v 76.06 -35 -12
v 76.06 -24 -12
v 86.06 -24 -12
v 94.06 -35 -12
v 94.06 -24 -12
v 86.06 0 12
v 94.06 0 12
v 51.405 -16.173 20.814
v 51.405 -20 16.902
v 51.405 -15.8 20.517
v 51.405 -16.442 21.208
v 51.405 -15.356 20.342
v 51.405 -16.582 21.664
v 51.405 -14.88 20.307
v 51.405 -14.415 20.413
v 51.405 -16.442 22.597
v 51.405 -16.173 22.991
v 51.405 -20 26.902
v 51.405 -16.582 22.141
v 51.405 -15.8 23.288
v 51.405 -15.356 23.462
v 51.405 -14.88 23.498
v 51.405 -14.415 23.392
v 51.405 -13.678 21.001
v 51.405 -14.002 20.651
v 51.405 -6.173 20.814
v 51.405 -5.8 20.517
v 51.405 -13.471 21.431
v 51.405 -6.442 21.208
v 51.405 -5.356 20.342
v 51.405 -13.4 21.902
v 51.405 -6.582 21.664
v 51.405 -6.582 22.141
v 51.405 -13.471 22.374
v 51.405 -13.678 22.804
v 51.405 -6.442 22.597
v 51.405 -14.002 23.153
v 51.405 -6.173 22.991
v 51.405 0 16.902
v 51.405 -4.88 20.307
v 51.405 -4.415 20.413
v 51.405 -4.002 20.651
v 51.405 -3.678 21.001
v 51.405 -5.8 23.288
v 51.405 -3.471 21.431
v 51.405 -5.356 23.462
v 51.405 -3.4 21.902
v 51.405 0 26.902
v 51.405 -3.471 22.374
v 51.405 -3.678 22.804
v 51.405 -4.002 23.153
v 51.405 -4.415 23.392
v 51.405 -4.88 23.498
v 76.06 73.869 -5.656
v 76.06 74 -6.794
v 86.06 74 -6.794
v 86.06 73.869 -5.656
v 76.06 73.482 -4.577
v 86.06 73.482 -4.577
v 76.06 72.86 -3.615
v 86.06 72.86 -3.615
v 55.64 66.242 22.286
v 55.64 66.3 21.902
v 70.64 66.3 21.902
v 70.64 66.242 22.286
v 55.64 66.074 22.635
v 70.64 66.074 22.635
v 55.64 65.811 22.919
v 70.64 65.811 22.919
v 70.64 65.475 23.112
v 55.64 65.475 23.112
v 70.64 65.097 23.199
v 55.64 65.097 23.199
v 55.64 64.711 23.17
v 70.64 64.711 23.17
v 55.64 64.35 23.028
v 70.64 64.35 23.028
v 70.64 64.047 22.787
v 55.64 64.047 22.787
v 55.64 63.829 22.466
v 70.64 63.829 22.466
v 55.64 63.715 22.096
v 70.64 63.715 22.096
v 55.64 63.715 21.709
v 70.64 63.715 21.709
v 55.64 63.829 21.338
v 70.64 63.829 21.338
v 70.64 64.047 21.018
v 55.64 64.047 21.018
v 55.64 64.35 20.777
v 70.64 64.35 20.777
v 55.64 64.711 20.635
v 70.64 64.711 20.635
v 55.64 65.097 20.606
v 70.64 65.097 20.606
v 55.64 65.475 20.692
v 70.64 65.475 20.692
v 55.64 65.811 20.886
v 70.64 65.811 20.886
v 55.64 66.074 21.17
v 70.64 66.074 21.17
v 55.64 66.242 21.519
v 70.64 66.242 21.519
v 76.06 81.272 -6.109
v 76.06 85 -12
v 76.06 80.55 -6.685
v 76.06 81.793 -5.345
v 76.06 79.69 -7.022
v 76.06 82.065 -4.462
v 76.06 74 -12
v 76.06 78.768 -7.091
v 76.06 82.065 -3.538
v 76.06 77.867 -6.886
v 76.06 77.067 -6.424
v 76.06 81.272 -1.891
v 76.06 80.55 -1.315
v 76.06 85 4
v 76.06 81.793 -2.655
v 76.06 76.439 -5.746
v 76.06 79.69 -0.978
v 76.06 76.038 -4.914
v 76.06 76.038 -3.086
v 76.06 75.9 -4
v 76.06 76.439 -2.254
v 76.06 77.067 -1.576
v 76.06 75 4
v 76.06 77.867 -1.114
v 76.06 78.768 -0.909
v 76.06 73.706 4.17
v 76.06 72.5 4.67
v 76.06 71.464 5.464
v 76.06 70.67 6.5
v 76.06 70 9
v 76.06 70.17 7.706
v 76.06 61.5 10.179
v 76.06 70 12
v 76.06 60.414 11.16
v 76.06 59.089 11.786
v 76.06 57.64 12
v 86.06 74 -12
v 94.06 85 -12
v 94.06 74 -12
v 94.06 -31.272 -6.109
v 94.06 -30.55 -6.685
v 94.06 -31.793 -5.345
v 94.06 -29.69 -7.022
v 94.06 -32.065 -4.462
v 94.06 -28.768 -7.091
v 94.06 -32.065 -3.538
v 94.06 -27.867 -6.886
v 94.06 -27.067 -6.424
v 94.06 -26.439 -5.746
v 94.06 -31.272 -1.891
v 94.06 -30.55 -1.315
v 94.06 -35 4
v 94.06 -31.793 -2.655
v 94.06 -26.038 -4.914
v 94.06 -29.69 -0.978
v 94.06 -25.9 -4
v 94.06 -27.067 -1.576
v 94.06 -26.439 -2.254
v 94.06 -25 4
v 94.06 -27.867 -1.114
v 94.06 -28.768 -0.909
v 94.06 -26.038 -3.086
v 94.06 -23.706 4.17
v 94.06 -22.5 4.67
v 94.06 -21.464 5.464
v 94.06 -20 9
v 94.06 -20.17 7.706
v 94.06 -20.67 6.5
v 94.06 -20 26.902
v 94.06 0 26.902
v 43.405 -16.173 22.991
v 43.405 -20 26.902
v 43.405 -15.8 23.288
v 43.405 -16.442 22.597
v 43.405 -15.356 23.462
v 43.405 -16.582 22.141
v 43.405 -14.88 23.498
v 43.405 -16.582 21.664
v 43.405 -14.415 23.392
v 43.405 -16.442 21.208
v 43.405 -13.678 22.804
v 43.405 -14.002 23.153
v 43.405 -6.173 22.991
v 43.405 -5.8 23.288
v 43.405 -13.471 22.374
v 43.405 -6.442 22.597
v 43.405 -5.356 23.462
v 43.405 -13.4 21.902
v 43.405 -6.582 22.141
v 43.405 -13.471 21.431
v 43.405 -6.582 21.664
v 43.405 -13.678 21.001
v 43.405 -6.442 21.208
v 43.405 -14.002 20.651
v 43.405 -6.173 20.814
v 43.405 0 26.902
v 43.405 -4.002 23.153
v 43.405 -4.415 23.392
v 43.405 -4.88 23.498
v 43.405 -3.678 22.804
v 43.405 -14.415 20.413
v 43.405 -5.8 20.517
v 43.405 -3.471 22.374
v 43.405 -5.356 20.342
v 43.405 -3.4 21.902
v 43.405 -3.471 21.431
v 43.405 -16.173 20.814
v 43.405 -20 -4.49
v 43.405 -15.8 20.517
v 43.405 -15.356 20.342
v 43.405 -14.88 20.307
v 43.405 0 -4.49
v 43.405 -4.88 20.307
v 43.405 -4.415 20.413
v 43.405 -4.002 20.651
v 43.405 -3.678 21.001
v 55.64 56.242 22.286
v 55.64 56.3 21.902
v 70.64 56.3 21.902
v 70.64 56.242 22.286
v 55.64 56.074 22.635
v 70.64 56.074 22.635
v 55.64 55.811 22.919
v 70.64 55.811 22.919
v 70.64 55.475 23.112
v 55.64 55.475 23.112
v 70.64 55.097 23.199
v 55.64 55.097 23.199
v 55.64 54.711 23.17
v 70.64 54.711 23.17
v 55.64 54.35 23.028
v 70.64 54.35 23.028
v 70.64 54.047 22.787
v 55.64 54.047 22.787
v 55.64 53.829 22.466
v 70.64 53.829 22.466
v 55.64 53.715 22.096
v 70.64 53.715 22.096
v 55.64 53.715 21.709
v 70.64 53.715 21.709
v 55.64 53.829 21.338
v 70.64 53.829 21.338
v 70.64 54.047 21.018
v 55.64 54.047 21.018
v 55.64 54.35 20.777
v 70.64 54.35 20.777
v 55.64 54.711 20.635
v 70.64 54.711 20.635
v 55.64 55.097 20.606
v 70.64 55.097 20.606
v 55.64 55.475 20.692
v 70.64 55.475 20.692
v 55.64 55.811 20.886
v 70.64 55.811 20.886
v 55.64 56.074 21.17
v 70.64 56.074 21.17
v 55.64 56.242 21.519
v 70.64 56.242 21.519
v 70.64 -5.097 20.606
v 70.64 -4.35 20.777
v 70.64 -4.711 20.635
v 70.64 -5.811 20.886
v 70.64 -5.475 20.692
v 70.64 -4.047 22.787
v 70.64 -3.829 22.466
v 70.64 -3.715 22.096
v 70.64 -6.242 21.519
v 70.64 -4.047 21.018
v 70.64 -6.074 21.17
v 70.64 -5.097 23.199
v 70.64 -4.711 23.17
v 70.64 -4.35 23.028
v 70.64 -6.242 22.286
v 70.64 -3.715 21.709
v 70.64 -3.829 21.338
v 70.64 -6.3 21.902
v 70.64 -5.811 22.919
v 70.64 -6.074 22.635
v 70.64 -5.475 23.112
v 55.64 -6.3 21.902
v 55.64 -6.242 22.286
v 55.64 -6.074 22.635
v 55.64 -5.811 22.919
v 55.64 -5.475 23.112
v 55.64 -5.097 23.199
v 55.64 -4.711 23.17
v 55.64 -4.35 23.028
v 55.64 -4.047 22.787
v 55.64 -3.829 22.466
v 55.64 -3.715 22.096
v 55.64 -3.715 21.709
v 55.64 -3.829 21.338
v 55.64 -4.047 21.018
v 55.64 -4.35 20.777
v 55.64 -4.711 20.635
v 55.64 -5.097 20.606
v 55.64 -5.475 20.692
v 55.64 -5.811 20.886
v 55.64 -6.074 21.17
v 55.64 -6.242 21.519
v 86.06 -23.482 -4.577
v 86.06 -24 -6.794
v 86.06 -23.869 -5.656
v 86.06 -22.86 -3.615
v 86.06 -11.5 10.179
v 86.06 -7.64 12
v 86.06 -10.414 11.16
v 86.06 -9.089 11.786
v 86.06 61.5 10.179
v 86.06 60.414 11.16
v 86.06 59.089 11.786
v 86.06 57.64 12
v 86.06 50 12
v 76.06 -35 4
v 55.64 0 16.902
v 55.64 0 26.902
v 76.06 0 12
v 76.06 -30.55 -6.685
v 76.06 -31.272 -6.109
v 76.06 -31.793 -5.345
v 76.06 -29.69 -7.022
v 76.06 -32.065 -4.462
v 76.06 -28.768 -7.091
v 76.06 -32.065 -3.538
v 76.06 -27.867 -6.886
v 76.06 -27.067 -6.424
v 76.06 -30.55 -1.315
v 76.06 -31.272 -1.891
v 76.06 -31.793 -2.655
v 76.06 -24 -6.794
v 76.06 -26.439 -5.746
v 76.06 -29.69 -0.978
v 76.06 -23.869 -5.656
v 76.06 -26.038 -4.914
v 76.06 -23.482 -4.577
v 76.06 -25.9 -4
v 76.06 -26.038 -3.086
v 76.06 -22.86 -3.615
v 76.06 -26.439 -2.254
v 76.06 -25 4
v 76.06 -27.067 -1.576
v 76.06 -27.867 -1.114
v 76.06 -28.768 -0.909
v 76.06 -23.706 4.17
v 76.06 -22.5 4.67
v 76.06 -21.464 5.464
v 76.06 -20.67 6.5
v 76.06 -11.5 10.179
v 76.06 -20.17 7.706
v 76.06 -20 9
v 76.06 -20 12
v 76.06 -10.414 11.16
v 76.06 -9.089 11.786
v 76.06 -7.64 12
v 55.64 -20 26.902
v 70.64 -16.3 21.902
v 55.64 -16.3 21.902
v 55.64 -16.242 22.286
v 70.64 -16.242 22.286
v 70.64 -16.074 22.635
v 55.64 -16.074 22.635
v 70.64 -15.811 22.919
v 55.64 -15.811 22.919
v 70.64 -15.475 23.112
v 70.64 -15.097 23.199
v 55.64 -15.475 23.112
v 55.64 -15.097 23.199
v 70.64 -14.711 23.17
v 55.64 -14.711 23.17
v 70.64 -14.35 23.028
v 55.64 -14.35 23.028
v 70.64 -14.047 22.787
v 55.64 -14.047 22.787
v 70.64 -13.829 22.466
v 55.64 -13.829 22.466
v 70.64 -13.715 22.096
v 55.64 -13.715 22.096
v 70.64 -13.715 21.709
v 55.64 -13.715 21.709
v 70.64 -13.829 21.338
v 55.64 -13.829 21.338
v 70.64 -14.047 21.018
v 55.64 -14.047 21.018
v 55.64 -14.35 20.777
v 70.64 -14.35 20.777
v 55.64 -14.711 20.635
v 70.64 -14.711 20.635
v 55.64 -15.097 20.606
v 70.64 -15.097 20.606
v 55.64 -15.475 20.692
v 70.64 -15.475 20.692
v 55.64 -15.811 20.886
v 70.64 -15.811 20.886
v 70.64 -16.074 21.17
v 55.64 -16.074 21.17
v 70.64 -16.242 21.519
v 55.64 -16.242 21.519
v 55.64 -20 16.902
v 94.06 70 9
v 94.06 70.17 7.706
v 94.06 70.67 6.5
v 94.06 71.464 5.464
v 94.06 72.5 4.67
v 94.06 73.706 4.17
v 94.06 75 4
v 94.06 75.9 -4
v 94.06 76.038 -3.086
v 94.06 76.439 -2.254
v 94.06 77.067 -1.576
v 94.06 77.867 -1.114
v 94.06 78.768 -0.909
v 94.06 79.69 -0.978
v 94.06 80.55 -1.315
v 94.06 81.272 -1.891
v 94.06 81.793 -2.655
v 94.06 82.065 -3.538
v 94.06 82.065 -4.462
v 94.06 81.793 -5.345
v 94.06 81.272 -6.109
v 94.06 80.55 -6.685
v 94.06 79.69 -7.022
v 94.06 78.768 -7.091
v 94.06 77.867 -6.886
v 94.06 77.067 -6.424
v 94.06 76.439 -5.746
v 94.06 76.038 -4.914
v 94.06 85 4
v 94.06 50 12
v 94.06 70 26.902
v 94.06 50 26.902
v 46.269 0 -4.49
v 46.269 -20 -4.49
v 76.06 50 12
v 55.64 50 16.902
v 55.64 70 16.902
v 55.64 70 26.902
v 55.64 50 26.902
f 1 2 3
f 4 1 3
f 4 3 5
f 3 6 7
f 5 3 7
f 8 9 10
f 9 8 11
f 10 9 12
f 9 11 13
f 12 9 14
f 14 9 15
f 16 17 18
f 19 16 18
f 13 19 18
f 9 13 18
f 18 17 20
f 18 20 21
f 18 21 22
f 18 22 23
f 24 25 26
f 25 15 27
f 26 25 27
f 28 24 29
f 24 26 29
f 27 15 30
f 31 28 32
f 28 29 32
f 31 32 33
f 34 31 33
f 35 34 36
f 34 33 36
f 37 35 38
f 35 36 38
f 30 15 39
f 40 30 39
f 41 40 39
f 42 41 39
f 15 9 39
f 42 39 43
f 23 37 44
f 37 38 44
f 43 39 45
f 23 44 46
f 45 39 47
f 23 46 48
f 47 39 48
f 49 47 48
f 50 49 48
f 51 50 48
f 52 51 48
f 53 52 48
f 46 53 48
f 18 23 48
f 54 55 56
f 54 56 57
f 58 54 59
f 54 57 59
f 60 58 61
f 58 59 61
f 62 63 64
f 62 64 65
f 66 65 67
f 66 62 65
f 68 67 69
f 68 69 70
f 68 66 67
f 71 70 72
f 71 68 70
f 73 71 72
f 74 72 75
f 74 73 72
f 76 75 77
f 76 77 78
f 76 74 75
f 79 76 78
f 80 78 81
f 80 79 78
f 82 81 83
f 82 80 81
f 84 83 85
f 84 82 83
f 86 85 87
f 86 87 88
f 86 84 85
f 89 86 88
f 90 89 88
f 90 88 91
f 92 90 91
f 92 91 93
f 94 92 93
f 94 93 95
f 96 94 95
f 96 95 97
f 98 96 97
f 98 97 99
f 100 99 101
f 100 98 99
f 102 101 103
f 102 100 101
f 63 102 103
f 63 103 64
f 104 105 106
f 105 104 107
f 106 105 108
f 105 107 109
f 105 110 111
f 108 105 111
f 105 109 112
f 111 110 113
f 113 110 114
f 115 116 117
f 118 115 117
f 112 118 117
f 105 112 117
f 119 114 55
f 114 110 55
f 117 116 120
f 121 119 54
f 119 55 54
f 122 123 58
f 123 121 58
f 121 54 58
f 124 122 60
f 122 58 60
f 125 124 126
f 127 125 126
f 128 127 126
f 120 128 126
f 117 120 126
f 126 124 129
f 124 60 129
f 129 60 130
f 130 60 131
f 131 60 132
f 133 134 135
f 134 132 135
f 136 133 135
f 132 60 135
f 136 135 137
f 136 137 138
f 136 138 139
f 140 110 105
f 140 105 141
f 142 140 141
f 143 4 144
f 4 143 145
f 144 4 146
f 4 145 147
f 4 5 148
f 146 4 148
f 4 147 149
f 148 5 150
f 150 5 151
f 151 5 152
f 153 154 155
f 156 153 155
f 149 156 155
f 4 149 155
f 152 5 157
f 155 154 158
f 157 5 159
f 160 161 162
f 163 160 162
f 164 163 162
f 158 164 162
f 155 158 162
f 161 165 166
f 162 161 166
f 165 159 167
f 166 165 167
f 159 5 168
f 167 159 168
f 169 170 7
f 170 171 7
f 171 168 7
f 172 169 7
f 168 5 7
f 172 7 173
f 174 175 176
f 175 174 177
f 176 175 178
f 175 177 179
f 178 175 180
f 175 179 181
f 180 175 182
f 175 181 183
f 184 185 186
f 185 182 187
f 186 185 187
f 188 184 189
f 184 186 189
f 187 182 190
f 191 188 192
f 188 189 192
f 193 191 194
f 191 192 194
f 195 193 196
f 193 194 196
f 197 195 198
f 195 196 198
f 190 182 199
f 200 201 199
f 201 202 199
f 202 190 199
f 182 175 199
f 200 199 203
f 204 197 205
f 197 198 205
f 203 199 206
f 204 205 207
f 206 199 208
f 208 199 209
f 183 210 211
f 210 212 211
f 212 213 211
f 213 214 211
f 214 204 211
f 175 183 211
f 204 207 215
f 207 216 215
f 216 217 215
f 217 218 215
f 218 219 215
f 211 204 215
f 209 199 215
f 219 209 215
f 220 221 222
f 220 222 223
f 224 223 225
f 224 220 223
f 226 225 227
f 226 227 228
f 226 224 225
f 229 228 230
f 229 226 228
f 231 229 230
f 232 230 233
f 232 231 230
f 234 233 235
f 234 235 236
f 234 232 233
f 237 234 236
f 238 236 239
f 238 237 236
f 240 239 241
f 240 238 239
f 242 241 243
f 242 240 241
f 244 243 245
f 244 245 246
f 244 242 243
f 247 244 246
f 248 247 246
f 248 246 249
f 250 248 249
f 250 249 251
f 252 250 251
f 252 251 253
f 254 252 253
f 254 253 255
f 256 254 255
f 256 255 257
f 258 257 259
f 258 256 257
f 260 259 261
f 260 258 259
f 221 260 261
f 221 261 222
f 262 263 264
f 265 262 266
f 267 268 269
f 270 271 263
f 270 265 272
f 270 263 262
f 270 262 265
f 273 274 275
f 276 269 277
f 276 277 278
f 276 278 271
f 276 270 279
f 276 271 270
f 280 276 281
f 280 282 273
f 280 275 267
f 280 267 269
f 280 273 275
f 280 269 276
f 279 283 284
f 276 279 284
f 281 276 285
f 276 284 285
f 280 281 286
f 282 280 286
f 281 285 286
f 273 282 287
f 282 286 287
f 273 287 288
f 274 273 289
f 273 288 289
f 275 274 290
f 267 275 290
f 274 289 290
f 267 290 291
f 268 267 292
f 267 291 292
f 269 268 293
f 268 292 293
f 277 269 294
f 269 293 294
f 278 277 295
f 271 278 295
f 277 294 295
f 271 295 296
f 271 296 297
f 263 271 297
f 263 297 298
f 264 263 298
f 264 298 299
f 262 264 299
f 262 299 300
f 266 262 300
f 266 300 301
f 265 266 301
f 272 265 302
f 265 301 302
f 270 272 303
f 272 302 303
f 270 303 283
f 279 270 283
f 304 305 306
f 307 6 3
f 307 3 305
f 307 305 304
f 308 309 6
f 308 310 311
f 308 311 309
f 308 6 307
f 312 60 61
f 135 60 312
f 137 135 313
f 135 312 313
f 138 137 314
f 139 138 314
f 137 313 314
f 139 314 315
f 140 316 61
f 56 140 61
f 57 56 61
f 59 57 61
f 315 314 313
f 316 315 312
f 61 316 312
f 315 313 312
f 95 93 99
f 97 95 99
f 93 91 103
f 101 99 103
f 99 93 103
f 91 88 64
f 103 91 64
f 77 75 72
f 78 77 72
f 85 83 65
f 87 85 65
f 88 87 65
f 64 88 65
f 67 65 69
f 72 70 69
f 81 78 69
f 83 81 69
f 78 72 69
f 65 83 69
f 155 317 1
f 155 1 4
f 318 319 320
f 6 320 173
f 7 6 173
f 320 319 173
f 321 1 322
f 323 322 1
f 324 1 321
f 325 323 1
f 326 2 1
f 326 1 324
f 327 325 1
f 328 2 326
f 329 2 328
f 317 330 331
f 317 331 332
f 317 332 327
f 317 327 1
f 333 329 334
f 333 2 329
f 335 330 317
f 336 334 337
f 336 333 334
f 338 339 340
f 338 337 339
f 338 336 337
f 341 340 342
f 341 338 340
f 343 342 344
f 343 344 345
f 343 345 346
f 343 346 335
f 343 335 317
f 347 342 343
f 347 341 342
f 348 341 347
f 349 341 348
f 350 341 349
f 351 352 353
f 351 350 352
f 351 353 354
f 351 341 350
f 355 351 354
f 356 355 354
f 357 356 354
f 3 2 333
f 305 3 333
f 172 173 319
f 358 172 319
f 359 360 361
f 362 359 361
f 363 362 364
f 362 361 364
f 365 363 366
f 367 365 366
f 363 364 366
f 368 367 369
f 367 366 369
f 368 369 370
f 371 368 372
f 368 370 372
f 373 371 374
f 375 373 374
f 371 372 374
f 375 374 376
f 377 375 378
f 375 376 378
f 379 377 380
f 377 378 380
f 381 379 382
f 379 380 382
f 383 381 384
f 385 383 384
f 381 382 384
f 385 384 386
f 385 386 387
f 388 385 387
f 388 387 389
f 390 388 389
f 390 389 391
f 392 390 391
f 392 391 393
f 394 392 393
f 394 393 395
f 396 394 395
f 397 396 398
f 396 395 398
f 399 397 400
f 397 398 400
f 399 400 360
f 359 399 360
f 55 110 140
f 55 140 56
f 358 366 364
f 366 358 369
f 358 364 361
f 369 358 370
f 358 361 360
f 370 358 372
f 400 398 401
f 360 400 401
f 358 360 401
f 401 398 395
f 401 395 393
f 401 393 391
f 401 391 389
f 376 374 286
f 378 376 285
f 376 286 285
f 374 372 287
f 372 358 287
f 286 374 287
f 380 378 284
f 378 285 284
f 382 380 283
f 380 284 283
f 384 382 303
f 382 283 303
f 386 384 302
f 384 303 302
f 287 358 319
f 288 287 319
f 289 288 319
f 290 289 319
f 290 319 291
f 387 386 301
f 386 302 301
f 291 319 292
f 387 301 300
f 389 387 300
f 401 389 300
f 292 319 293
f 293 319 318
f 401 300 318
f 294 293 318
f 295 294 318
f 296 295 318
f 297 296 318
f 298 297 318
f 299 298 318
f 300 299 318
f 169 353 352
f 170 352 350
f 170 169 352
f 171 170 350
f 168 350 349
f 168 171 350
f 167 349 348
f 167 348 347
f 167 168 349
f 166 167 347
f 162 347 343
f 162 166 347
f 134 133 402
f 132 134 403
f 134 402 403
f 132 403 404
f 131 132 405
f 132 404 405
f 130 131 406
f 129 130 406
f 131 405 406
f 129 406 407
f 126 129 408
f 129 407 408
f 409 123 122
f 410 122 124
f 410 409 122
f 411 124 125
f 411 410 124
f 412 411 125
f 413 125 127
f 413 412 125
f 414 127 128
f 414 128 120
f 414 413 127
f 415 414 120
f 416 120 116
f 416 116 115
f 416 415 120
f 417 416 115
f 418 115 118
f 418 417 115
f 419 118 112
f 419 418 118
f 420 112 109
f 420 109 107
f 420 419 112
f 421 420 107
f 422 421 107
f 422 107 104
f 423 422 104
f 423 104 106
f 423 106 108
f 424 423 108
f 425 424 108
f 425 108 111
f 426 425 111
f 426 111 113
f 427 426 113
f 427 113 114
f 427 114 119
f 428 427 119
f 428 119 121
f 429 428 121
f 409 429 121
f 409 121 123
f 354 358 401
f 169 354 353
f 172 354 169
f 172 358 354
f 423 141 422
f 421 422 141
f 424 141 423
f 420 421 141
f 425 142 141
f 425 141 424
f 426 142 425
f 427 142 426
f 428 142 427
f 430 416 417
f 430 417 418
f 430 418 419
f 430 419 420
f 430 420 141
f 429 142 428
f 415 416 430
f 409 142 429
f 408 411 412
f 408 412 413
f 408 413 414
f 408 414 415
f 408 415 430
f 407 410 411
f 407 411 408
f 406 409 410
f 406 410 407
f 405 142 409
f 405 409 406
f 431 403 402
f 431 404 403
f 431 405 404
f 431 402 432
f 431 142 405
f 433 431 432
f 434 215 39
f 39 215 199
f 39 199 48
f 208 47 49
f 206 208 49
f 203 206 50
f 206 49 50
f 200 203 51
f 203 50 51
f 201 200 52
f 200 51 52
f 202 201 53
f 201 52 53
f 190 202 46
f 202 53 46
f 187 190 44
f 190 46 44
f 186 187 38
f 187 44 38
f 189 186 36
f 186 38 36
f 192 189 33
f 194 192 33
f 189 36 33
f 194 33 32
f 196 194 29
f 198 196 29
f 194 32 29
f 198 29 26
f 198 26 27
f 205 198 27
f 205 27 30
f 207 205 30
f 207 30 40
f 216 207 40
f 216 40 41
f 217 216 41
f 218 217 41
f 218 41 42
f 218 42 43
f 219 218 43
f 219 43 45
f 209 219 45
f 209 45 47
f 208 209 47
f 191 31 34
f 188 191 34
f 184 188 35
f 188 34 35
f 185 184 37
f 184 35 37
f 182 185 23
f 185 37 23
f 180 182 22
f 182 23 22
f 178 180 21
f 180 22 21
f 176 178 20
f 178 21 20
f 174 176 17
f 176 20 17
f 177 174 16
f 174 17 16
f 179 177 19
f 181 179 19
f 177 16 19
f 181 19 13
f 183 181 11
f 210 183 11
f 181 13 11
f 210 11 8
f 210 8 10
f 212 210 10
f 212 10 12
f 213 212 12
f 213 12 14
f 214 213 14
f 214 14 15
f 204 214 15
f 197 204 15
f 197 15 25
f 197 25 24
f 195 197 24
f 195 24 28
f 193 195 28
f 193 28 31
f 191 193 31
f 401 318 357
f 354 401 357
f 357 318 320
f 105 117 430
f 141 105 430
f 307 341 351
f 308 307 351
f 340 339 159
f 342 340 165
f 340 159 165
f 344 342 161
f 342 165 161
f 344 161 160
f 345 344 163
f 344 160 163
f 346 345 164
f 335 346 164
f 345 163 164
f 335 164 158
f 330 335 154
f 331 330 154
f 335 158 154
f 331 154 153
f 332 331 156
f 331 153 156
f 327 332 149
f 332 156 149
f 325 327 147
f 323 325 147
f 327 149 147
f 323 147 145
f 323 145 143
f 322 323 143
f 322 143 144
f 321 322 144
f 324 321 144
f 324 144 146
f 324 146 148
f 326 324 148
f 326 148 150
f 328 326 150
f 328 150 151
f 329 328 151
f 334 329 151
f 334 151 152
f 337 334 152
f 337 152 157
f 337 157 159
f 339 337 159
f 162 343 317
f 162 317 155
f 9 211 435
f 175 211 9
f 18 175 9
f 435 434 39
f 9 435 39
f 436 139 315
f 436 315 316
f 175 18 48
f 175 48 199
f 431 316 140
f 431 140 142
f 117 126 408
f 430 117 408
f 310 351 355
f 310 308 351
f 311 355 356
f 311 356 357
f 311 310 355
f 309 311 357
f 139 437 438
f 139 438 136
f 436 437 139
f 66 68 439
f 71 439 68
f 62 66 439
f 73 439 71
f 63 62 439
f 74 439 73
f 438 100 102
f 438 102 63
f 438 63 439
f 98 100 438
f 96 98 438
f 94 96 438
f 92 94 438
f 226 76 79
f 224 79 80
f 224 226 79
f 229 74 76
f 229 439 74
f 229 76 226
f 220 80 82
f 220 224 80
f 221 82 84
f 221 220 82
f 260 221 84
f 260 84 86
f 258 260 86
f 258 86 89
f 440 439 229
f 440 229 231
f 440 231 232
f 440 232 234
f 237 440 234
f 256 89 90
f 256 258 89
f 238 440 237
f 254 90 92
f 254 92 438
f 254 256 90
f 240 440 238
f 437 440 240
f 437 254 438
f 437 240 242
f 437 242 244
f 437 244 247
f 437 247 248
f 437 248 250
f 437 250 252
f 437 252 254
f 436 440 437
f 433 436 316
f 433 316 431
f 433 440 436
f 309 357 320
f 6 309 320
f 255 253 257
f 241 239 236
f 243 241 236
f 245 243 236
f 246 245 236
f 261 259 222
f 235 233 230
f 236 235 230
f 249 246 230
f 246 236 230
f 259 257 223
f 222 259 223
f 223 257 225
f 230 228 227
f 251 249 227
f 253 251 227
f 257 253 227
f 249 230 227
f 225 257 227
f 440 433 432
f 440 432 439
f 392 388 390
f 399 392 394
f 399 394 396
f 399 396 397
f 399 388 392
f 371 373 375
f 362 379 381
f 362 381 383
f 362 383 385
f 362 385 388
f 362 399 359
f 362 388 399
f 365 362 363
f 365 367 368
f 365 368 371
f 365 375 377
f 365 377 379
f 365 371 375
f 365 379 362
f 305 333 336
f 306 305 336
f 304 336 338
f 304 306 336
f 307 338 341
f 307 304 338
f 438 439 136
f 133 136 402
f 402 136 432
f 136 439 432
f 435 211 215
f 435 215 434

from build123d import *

# Parameters (mm, degrees)
F0_W      = 18
F0_H      = 24
F1_DEPTH  = 20
F2_R      = 1.3
F3_DEPTH  = 15
F4_R      = 1.6
F5_DEPTH  = 10
F6_W      = 18
F6_H      = 16
F7_DEPTH  = 15
F8_R      = 3.1
F9_DEPTH  = 50.6556891443
F10_SIZE  = 24
F12_DEPTH = 10
F13_R     = 5


with BuildPart() as f1:
    # F0 (on Front) → F1 (new body)
    with BuildSketch(Plane.XZ):
        with Locations((85.0597769022, 0)):
            Rectangle(F0_W, F0_H)
        Polygon((76.0597769022, 12), (94.0597769022, 12), (94.0597769022, 26.902352641), (55.6400085738, 26.902352641), (55.6400085738, 16.902352641), align=None)
    extrude(amount=F1_DEPTH)

    # F2 (on face) → F3 (cut)
    with BuildSketch(Plane(origin=(55.6400085738, 0, 0), x_dir=(0, -1, 0), z_dir=(-1, 0, 0))):
        with Locations((15, 21.902352641)):
            Circle(F2_R)
        with Locations((5, 21.902352641)):
            Circle(F2_R)
    extrude(amount=-F3_DEPTH, mode=Mode.SUBTRACT)

    # F6 (on face) → F7 (join)
    with BuildSketch(Plane.XZ.offset(20)):
        with Locations((85.0597769022, -4)):
            Rectangle(F6_W, F6_H)
    extrude(amount=F7_DEPTH)

    # F8 (on face) → F9 (cut, through all)
    with BuildSketch(Plane.YZ.offset(94.0597769022)):
        with Locations((-29, -4)):
            Circle(F8_R)
    extrude(amount=-F9_DEPTH, mode=Mode.SUBTRACT)

    # F10
    f10_edges = [f1.edges().sort_by_distance(p)[0] for p in [
        (85.059777, 0, -12),
    ]]
    chamfer(f10_edges, length=F10_SIZE)

    # F11 (on face) → F12 (cut)
    with BuildSketch(Plane(origin=(76.0597769022, 0, 0), x_dir=(0, -1, 0), z_dir=(-1, 0, 0))):
        Polygon((10, 12), (0, 12), (24, -12), (24, -5), align=None)
    extrude(amount=-F12_DEPTH, mode=Mode.SUBTRACT)

    # F13
    f13_edges = [f1.edges().sort_by_distance(p)[0] for p in [
        (85.059777, -20, 4),
        (81.059777, -24, -5),
        (81.059777, -10, 12),
    ]]
    fillet(f13_edges, radius=F13_R)


with BuildPart() as f1b:
    # F0 (on Front) → F1, piece 2 (new body)
    with BuildSketch(Plane.XZ):
        Polygon((51.4050877579, 16.902352641), (51.4050877579, 26.902352641), (43.4050877579, 26.902352641), (43.4050877579, -4.4897856078), (46.2692897531, -4.4897856078), align=None)
    extrude(amount=F1_DEPTH)

    # F4 (on face) → F5 (cut)
    with BuildSketch(Plane.YZ.offset(51.4050877579)):
        with Locations((-15, 21.902352641)):
            Circle(F4_R)
        with Locations((-5, 21.902352641)):
            Circle(F4_R)
    extrude(amount=-F5_DEPTH, mode=Mode.SUBTRACT)


with BuildPart() as f15_1:
    # F15: instance of F1
    add(f1.part.mirror(Plane(origin=(76.0380731249, 25, 20.0084246403), x_dir=(1, 0, 0), z_dir=(0, 1, 0))))


solid = Compound([f1.part, f1b.part, f15_1.part])
